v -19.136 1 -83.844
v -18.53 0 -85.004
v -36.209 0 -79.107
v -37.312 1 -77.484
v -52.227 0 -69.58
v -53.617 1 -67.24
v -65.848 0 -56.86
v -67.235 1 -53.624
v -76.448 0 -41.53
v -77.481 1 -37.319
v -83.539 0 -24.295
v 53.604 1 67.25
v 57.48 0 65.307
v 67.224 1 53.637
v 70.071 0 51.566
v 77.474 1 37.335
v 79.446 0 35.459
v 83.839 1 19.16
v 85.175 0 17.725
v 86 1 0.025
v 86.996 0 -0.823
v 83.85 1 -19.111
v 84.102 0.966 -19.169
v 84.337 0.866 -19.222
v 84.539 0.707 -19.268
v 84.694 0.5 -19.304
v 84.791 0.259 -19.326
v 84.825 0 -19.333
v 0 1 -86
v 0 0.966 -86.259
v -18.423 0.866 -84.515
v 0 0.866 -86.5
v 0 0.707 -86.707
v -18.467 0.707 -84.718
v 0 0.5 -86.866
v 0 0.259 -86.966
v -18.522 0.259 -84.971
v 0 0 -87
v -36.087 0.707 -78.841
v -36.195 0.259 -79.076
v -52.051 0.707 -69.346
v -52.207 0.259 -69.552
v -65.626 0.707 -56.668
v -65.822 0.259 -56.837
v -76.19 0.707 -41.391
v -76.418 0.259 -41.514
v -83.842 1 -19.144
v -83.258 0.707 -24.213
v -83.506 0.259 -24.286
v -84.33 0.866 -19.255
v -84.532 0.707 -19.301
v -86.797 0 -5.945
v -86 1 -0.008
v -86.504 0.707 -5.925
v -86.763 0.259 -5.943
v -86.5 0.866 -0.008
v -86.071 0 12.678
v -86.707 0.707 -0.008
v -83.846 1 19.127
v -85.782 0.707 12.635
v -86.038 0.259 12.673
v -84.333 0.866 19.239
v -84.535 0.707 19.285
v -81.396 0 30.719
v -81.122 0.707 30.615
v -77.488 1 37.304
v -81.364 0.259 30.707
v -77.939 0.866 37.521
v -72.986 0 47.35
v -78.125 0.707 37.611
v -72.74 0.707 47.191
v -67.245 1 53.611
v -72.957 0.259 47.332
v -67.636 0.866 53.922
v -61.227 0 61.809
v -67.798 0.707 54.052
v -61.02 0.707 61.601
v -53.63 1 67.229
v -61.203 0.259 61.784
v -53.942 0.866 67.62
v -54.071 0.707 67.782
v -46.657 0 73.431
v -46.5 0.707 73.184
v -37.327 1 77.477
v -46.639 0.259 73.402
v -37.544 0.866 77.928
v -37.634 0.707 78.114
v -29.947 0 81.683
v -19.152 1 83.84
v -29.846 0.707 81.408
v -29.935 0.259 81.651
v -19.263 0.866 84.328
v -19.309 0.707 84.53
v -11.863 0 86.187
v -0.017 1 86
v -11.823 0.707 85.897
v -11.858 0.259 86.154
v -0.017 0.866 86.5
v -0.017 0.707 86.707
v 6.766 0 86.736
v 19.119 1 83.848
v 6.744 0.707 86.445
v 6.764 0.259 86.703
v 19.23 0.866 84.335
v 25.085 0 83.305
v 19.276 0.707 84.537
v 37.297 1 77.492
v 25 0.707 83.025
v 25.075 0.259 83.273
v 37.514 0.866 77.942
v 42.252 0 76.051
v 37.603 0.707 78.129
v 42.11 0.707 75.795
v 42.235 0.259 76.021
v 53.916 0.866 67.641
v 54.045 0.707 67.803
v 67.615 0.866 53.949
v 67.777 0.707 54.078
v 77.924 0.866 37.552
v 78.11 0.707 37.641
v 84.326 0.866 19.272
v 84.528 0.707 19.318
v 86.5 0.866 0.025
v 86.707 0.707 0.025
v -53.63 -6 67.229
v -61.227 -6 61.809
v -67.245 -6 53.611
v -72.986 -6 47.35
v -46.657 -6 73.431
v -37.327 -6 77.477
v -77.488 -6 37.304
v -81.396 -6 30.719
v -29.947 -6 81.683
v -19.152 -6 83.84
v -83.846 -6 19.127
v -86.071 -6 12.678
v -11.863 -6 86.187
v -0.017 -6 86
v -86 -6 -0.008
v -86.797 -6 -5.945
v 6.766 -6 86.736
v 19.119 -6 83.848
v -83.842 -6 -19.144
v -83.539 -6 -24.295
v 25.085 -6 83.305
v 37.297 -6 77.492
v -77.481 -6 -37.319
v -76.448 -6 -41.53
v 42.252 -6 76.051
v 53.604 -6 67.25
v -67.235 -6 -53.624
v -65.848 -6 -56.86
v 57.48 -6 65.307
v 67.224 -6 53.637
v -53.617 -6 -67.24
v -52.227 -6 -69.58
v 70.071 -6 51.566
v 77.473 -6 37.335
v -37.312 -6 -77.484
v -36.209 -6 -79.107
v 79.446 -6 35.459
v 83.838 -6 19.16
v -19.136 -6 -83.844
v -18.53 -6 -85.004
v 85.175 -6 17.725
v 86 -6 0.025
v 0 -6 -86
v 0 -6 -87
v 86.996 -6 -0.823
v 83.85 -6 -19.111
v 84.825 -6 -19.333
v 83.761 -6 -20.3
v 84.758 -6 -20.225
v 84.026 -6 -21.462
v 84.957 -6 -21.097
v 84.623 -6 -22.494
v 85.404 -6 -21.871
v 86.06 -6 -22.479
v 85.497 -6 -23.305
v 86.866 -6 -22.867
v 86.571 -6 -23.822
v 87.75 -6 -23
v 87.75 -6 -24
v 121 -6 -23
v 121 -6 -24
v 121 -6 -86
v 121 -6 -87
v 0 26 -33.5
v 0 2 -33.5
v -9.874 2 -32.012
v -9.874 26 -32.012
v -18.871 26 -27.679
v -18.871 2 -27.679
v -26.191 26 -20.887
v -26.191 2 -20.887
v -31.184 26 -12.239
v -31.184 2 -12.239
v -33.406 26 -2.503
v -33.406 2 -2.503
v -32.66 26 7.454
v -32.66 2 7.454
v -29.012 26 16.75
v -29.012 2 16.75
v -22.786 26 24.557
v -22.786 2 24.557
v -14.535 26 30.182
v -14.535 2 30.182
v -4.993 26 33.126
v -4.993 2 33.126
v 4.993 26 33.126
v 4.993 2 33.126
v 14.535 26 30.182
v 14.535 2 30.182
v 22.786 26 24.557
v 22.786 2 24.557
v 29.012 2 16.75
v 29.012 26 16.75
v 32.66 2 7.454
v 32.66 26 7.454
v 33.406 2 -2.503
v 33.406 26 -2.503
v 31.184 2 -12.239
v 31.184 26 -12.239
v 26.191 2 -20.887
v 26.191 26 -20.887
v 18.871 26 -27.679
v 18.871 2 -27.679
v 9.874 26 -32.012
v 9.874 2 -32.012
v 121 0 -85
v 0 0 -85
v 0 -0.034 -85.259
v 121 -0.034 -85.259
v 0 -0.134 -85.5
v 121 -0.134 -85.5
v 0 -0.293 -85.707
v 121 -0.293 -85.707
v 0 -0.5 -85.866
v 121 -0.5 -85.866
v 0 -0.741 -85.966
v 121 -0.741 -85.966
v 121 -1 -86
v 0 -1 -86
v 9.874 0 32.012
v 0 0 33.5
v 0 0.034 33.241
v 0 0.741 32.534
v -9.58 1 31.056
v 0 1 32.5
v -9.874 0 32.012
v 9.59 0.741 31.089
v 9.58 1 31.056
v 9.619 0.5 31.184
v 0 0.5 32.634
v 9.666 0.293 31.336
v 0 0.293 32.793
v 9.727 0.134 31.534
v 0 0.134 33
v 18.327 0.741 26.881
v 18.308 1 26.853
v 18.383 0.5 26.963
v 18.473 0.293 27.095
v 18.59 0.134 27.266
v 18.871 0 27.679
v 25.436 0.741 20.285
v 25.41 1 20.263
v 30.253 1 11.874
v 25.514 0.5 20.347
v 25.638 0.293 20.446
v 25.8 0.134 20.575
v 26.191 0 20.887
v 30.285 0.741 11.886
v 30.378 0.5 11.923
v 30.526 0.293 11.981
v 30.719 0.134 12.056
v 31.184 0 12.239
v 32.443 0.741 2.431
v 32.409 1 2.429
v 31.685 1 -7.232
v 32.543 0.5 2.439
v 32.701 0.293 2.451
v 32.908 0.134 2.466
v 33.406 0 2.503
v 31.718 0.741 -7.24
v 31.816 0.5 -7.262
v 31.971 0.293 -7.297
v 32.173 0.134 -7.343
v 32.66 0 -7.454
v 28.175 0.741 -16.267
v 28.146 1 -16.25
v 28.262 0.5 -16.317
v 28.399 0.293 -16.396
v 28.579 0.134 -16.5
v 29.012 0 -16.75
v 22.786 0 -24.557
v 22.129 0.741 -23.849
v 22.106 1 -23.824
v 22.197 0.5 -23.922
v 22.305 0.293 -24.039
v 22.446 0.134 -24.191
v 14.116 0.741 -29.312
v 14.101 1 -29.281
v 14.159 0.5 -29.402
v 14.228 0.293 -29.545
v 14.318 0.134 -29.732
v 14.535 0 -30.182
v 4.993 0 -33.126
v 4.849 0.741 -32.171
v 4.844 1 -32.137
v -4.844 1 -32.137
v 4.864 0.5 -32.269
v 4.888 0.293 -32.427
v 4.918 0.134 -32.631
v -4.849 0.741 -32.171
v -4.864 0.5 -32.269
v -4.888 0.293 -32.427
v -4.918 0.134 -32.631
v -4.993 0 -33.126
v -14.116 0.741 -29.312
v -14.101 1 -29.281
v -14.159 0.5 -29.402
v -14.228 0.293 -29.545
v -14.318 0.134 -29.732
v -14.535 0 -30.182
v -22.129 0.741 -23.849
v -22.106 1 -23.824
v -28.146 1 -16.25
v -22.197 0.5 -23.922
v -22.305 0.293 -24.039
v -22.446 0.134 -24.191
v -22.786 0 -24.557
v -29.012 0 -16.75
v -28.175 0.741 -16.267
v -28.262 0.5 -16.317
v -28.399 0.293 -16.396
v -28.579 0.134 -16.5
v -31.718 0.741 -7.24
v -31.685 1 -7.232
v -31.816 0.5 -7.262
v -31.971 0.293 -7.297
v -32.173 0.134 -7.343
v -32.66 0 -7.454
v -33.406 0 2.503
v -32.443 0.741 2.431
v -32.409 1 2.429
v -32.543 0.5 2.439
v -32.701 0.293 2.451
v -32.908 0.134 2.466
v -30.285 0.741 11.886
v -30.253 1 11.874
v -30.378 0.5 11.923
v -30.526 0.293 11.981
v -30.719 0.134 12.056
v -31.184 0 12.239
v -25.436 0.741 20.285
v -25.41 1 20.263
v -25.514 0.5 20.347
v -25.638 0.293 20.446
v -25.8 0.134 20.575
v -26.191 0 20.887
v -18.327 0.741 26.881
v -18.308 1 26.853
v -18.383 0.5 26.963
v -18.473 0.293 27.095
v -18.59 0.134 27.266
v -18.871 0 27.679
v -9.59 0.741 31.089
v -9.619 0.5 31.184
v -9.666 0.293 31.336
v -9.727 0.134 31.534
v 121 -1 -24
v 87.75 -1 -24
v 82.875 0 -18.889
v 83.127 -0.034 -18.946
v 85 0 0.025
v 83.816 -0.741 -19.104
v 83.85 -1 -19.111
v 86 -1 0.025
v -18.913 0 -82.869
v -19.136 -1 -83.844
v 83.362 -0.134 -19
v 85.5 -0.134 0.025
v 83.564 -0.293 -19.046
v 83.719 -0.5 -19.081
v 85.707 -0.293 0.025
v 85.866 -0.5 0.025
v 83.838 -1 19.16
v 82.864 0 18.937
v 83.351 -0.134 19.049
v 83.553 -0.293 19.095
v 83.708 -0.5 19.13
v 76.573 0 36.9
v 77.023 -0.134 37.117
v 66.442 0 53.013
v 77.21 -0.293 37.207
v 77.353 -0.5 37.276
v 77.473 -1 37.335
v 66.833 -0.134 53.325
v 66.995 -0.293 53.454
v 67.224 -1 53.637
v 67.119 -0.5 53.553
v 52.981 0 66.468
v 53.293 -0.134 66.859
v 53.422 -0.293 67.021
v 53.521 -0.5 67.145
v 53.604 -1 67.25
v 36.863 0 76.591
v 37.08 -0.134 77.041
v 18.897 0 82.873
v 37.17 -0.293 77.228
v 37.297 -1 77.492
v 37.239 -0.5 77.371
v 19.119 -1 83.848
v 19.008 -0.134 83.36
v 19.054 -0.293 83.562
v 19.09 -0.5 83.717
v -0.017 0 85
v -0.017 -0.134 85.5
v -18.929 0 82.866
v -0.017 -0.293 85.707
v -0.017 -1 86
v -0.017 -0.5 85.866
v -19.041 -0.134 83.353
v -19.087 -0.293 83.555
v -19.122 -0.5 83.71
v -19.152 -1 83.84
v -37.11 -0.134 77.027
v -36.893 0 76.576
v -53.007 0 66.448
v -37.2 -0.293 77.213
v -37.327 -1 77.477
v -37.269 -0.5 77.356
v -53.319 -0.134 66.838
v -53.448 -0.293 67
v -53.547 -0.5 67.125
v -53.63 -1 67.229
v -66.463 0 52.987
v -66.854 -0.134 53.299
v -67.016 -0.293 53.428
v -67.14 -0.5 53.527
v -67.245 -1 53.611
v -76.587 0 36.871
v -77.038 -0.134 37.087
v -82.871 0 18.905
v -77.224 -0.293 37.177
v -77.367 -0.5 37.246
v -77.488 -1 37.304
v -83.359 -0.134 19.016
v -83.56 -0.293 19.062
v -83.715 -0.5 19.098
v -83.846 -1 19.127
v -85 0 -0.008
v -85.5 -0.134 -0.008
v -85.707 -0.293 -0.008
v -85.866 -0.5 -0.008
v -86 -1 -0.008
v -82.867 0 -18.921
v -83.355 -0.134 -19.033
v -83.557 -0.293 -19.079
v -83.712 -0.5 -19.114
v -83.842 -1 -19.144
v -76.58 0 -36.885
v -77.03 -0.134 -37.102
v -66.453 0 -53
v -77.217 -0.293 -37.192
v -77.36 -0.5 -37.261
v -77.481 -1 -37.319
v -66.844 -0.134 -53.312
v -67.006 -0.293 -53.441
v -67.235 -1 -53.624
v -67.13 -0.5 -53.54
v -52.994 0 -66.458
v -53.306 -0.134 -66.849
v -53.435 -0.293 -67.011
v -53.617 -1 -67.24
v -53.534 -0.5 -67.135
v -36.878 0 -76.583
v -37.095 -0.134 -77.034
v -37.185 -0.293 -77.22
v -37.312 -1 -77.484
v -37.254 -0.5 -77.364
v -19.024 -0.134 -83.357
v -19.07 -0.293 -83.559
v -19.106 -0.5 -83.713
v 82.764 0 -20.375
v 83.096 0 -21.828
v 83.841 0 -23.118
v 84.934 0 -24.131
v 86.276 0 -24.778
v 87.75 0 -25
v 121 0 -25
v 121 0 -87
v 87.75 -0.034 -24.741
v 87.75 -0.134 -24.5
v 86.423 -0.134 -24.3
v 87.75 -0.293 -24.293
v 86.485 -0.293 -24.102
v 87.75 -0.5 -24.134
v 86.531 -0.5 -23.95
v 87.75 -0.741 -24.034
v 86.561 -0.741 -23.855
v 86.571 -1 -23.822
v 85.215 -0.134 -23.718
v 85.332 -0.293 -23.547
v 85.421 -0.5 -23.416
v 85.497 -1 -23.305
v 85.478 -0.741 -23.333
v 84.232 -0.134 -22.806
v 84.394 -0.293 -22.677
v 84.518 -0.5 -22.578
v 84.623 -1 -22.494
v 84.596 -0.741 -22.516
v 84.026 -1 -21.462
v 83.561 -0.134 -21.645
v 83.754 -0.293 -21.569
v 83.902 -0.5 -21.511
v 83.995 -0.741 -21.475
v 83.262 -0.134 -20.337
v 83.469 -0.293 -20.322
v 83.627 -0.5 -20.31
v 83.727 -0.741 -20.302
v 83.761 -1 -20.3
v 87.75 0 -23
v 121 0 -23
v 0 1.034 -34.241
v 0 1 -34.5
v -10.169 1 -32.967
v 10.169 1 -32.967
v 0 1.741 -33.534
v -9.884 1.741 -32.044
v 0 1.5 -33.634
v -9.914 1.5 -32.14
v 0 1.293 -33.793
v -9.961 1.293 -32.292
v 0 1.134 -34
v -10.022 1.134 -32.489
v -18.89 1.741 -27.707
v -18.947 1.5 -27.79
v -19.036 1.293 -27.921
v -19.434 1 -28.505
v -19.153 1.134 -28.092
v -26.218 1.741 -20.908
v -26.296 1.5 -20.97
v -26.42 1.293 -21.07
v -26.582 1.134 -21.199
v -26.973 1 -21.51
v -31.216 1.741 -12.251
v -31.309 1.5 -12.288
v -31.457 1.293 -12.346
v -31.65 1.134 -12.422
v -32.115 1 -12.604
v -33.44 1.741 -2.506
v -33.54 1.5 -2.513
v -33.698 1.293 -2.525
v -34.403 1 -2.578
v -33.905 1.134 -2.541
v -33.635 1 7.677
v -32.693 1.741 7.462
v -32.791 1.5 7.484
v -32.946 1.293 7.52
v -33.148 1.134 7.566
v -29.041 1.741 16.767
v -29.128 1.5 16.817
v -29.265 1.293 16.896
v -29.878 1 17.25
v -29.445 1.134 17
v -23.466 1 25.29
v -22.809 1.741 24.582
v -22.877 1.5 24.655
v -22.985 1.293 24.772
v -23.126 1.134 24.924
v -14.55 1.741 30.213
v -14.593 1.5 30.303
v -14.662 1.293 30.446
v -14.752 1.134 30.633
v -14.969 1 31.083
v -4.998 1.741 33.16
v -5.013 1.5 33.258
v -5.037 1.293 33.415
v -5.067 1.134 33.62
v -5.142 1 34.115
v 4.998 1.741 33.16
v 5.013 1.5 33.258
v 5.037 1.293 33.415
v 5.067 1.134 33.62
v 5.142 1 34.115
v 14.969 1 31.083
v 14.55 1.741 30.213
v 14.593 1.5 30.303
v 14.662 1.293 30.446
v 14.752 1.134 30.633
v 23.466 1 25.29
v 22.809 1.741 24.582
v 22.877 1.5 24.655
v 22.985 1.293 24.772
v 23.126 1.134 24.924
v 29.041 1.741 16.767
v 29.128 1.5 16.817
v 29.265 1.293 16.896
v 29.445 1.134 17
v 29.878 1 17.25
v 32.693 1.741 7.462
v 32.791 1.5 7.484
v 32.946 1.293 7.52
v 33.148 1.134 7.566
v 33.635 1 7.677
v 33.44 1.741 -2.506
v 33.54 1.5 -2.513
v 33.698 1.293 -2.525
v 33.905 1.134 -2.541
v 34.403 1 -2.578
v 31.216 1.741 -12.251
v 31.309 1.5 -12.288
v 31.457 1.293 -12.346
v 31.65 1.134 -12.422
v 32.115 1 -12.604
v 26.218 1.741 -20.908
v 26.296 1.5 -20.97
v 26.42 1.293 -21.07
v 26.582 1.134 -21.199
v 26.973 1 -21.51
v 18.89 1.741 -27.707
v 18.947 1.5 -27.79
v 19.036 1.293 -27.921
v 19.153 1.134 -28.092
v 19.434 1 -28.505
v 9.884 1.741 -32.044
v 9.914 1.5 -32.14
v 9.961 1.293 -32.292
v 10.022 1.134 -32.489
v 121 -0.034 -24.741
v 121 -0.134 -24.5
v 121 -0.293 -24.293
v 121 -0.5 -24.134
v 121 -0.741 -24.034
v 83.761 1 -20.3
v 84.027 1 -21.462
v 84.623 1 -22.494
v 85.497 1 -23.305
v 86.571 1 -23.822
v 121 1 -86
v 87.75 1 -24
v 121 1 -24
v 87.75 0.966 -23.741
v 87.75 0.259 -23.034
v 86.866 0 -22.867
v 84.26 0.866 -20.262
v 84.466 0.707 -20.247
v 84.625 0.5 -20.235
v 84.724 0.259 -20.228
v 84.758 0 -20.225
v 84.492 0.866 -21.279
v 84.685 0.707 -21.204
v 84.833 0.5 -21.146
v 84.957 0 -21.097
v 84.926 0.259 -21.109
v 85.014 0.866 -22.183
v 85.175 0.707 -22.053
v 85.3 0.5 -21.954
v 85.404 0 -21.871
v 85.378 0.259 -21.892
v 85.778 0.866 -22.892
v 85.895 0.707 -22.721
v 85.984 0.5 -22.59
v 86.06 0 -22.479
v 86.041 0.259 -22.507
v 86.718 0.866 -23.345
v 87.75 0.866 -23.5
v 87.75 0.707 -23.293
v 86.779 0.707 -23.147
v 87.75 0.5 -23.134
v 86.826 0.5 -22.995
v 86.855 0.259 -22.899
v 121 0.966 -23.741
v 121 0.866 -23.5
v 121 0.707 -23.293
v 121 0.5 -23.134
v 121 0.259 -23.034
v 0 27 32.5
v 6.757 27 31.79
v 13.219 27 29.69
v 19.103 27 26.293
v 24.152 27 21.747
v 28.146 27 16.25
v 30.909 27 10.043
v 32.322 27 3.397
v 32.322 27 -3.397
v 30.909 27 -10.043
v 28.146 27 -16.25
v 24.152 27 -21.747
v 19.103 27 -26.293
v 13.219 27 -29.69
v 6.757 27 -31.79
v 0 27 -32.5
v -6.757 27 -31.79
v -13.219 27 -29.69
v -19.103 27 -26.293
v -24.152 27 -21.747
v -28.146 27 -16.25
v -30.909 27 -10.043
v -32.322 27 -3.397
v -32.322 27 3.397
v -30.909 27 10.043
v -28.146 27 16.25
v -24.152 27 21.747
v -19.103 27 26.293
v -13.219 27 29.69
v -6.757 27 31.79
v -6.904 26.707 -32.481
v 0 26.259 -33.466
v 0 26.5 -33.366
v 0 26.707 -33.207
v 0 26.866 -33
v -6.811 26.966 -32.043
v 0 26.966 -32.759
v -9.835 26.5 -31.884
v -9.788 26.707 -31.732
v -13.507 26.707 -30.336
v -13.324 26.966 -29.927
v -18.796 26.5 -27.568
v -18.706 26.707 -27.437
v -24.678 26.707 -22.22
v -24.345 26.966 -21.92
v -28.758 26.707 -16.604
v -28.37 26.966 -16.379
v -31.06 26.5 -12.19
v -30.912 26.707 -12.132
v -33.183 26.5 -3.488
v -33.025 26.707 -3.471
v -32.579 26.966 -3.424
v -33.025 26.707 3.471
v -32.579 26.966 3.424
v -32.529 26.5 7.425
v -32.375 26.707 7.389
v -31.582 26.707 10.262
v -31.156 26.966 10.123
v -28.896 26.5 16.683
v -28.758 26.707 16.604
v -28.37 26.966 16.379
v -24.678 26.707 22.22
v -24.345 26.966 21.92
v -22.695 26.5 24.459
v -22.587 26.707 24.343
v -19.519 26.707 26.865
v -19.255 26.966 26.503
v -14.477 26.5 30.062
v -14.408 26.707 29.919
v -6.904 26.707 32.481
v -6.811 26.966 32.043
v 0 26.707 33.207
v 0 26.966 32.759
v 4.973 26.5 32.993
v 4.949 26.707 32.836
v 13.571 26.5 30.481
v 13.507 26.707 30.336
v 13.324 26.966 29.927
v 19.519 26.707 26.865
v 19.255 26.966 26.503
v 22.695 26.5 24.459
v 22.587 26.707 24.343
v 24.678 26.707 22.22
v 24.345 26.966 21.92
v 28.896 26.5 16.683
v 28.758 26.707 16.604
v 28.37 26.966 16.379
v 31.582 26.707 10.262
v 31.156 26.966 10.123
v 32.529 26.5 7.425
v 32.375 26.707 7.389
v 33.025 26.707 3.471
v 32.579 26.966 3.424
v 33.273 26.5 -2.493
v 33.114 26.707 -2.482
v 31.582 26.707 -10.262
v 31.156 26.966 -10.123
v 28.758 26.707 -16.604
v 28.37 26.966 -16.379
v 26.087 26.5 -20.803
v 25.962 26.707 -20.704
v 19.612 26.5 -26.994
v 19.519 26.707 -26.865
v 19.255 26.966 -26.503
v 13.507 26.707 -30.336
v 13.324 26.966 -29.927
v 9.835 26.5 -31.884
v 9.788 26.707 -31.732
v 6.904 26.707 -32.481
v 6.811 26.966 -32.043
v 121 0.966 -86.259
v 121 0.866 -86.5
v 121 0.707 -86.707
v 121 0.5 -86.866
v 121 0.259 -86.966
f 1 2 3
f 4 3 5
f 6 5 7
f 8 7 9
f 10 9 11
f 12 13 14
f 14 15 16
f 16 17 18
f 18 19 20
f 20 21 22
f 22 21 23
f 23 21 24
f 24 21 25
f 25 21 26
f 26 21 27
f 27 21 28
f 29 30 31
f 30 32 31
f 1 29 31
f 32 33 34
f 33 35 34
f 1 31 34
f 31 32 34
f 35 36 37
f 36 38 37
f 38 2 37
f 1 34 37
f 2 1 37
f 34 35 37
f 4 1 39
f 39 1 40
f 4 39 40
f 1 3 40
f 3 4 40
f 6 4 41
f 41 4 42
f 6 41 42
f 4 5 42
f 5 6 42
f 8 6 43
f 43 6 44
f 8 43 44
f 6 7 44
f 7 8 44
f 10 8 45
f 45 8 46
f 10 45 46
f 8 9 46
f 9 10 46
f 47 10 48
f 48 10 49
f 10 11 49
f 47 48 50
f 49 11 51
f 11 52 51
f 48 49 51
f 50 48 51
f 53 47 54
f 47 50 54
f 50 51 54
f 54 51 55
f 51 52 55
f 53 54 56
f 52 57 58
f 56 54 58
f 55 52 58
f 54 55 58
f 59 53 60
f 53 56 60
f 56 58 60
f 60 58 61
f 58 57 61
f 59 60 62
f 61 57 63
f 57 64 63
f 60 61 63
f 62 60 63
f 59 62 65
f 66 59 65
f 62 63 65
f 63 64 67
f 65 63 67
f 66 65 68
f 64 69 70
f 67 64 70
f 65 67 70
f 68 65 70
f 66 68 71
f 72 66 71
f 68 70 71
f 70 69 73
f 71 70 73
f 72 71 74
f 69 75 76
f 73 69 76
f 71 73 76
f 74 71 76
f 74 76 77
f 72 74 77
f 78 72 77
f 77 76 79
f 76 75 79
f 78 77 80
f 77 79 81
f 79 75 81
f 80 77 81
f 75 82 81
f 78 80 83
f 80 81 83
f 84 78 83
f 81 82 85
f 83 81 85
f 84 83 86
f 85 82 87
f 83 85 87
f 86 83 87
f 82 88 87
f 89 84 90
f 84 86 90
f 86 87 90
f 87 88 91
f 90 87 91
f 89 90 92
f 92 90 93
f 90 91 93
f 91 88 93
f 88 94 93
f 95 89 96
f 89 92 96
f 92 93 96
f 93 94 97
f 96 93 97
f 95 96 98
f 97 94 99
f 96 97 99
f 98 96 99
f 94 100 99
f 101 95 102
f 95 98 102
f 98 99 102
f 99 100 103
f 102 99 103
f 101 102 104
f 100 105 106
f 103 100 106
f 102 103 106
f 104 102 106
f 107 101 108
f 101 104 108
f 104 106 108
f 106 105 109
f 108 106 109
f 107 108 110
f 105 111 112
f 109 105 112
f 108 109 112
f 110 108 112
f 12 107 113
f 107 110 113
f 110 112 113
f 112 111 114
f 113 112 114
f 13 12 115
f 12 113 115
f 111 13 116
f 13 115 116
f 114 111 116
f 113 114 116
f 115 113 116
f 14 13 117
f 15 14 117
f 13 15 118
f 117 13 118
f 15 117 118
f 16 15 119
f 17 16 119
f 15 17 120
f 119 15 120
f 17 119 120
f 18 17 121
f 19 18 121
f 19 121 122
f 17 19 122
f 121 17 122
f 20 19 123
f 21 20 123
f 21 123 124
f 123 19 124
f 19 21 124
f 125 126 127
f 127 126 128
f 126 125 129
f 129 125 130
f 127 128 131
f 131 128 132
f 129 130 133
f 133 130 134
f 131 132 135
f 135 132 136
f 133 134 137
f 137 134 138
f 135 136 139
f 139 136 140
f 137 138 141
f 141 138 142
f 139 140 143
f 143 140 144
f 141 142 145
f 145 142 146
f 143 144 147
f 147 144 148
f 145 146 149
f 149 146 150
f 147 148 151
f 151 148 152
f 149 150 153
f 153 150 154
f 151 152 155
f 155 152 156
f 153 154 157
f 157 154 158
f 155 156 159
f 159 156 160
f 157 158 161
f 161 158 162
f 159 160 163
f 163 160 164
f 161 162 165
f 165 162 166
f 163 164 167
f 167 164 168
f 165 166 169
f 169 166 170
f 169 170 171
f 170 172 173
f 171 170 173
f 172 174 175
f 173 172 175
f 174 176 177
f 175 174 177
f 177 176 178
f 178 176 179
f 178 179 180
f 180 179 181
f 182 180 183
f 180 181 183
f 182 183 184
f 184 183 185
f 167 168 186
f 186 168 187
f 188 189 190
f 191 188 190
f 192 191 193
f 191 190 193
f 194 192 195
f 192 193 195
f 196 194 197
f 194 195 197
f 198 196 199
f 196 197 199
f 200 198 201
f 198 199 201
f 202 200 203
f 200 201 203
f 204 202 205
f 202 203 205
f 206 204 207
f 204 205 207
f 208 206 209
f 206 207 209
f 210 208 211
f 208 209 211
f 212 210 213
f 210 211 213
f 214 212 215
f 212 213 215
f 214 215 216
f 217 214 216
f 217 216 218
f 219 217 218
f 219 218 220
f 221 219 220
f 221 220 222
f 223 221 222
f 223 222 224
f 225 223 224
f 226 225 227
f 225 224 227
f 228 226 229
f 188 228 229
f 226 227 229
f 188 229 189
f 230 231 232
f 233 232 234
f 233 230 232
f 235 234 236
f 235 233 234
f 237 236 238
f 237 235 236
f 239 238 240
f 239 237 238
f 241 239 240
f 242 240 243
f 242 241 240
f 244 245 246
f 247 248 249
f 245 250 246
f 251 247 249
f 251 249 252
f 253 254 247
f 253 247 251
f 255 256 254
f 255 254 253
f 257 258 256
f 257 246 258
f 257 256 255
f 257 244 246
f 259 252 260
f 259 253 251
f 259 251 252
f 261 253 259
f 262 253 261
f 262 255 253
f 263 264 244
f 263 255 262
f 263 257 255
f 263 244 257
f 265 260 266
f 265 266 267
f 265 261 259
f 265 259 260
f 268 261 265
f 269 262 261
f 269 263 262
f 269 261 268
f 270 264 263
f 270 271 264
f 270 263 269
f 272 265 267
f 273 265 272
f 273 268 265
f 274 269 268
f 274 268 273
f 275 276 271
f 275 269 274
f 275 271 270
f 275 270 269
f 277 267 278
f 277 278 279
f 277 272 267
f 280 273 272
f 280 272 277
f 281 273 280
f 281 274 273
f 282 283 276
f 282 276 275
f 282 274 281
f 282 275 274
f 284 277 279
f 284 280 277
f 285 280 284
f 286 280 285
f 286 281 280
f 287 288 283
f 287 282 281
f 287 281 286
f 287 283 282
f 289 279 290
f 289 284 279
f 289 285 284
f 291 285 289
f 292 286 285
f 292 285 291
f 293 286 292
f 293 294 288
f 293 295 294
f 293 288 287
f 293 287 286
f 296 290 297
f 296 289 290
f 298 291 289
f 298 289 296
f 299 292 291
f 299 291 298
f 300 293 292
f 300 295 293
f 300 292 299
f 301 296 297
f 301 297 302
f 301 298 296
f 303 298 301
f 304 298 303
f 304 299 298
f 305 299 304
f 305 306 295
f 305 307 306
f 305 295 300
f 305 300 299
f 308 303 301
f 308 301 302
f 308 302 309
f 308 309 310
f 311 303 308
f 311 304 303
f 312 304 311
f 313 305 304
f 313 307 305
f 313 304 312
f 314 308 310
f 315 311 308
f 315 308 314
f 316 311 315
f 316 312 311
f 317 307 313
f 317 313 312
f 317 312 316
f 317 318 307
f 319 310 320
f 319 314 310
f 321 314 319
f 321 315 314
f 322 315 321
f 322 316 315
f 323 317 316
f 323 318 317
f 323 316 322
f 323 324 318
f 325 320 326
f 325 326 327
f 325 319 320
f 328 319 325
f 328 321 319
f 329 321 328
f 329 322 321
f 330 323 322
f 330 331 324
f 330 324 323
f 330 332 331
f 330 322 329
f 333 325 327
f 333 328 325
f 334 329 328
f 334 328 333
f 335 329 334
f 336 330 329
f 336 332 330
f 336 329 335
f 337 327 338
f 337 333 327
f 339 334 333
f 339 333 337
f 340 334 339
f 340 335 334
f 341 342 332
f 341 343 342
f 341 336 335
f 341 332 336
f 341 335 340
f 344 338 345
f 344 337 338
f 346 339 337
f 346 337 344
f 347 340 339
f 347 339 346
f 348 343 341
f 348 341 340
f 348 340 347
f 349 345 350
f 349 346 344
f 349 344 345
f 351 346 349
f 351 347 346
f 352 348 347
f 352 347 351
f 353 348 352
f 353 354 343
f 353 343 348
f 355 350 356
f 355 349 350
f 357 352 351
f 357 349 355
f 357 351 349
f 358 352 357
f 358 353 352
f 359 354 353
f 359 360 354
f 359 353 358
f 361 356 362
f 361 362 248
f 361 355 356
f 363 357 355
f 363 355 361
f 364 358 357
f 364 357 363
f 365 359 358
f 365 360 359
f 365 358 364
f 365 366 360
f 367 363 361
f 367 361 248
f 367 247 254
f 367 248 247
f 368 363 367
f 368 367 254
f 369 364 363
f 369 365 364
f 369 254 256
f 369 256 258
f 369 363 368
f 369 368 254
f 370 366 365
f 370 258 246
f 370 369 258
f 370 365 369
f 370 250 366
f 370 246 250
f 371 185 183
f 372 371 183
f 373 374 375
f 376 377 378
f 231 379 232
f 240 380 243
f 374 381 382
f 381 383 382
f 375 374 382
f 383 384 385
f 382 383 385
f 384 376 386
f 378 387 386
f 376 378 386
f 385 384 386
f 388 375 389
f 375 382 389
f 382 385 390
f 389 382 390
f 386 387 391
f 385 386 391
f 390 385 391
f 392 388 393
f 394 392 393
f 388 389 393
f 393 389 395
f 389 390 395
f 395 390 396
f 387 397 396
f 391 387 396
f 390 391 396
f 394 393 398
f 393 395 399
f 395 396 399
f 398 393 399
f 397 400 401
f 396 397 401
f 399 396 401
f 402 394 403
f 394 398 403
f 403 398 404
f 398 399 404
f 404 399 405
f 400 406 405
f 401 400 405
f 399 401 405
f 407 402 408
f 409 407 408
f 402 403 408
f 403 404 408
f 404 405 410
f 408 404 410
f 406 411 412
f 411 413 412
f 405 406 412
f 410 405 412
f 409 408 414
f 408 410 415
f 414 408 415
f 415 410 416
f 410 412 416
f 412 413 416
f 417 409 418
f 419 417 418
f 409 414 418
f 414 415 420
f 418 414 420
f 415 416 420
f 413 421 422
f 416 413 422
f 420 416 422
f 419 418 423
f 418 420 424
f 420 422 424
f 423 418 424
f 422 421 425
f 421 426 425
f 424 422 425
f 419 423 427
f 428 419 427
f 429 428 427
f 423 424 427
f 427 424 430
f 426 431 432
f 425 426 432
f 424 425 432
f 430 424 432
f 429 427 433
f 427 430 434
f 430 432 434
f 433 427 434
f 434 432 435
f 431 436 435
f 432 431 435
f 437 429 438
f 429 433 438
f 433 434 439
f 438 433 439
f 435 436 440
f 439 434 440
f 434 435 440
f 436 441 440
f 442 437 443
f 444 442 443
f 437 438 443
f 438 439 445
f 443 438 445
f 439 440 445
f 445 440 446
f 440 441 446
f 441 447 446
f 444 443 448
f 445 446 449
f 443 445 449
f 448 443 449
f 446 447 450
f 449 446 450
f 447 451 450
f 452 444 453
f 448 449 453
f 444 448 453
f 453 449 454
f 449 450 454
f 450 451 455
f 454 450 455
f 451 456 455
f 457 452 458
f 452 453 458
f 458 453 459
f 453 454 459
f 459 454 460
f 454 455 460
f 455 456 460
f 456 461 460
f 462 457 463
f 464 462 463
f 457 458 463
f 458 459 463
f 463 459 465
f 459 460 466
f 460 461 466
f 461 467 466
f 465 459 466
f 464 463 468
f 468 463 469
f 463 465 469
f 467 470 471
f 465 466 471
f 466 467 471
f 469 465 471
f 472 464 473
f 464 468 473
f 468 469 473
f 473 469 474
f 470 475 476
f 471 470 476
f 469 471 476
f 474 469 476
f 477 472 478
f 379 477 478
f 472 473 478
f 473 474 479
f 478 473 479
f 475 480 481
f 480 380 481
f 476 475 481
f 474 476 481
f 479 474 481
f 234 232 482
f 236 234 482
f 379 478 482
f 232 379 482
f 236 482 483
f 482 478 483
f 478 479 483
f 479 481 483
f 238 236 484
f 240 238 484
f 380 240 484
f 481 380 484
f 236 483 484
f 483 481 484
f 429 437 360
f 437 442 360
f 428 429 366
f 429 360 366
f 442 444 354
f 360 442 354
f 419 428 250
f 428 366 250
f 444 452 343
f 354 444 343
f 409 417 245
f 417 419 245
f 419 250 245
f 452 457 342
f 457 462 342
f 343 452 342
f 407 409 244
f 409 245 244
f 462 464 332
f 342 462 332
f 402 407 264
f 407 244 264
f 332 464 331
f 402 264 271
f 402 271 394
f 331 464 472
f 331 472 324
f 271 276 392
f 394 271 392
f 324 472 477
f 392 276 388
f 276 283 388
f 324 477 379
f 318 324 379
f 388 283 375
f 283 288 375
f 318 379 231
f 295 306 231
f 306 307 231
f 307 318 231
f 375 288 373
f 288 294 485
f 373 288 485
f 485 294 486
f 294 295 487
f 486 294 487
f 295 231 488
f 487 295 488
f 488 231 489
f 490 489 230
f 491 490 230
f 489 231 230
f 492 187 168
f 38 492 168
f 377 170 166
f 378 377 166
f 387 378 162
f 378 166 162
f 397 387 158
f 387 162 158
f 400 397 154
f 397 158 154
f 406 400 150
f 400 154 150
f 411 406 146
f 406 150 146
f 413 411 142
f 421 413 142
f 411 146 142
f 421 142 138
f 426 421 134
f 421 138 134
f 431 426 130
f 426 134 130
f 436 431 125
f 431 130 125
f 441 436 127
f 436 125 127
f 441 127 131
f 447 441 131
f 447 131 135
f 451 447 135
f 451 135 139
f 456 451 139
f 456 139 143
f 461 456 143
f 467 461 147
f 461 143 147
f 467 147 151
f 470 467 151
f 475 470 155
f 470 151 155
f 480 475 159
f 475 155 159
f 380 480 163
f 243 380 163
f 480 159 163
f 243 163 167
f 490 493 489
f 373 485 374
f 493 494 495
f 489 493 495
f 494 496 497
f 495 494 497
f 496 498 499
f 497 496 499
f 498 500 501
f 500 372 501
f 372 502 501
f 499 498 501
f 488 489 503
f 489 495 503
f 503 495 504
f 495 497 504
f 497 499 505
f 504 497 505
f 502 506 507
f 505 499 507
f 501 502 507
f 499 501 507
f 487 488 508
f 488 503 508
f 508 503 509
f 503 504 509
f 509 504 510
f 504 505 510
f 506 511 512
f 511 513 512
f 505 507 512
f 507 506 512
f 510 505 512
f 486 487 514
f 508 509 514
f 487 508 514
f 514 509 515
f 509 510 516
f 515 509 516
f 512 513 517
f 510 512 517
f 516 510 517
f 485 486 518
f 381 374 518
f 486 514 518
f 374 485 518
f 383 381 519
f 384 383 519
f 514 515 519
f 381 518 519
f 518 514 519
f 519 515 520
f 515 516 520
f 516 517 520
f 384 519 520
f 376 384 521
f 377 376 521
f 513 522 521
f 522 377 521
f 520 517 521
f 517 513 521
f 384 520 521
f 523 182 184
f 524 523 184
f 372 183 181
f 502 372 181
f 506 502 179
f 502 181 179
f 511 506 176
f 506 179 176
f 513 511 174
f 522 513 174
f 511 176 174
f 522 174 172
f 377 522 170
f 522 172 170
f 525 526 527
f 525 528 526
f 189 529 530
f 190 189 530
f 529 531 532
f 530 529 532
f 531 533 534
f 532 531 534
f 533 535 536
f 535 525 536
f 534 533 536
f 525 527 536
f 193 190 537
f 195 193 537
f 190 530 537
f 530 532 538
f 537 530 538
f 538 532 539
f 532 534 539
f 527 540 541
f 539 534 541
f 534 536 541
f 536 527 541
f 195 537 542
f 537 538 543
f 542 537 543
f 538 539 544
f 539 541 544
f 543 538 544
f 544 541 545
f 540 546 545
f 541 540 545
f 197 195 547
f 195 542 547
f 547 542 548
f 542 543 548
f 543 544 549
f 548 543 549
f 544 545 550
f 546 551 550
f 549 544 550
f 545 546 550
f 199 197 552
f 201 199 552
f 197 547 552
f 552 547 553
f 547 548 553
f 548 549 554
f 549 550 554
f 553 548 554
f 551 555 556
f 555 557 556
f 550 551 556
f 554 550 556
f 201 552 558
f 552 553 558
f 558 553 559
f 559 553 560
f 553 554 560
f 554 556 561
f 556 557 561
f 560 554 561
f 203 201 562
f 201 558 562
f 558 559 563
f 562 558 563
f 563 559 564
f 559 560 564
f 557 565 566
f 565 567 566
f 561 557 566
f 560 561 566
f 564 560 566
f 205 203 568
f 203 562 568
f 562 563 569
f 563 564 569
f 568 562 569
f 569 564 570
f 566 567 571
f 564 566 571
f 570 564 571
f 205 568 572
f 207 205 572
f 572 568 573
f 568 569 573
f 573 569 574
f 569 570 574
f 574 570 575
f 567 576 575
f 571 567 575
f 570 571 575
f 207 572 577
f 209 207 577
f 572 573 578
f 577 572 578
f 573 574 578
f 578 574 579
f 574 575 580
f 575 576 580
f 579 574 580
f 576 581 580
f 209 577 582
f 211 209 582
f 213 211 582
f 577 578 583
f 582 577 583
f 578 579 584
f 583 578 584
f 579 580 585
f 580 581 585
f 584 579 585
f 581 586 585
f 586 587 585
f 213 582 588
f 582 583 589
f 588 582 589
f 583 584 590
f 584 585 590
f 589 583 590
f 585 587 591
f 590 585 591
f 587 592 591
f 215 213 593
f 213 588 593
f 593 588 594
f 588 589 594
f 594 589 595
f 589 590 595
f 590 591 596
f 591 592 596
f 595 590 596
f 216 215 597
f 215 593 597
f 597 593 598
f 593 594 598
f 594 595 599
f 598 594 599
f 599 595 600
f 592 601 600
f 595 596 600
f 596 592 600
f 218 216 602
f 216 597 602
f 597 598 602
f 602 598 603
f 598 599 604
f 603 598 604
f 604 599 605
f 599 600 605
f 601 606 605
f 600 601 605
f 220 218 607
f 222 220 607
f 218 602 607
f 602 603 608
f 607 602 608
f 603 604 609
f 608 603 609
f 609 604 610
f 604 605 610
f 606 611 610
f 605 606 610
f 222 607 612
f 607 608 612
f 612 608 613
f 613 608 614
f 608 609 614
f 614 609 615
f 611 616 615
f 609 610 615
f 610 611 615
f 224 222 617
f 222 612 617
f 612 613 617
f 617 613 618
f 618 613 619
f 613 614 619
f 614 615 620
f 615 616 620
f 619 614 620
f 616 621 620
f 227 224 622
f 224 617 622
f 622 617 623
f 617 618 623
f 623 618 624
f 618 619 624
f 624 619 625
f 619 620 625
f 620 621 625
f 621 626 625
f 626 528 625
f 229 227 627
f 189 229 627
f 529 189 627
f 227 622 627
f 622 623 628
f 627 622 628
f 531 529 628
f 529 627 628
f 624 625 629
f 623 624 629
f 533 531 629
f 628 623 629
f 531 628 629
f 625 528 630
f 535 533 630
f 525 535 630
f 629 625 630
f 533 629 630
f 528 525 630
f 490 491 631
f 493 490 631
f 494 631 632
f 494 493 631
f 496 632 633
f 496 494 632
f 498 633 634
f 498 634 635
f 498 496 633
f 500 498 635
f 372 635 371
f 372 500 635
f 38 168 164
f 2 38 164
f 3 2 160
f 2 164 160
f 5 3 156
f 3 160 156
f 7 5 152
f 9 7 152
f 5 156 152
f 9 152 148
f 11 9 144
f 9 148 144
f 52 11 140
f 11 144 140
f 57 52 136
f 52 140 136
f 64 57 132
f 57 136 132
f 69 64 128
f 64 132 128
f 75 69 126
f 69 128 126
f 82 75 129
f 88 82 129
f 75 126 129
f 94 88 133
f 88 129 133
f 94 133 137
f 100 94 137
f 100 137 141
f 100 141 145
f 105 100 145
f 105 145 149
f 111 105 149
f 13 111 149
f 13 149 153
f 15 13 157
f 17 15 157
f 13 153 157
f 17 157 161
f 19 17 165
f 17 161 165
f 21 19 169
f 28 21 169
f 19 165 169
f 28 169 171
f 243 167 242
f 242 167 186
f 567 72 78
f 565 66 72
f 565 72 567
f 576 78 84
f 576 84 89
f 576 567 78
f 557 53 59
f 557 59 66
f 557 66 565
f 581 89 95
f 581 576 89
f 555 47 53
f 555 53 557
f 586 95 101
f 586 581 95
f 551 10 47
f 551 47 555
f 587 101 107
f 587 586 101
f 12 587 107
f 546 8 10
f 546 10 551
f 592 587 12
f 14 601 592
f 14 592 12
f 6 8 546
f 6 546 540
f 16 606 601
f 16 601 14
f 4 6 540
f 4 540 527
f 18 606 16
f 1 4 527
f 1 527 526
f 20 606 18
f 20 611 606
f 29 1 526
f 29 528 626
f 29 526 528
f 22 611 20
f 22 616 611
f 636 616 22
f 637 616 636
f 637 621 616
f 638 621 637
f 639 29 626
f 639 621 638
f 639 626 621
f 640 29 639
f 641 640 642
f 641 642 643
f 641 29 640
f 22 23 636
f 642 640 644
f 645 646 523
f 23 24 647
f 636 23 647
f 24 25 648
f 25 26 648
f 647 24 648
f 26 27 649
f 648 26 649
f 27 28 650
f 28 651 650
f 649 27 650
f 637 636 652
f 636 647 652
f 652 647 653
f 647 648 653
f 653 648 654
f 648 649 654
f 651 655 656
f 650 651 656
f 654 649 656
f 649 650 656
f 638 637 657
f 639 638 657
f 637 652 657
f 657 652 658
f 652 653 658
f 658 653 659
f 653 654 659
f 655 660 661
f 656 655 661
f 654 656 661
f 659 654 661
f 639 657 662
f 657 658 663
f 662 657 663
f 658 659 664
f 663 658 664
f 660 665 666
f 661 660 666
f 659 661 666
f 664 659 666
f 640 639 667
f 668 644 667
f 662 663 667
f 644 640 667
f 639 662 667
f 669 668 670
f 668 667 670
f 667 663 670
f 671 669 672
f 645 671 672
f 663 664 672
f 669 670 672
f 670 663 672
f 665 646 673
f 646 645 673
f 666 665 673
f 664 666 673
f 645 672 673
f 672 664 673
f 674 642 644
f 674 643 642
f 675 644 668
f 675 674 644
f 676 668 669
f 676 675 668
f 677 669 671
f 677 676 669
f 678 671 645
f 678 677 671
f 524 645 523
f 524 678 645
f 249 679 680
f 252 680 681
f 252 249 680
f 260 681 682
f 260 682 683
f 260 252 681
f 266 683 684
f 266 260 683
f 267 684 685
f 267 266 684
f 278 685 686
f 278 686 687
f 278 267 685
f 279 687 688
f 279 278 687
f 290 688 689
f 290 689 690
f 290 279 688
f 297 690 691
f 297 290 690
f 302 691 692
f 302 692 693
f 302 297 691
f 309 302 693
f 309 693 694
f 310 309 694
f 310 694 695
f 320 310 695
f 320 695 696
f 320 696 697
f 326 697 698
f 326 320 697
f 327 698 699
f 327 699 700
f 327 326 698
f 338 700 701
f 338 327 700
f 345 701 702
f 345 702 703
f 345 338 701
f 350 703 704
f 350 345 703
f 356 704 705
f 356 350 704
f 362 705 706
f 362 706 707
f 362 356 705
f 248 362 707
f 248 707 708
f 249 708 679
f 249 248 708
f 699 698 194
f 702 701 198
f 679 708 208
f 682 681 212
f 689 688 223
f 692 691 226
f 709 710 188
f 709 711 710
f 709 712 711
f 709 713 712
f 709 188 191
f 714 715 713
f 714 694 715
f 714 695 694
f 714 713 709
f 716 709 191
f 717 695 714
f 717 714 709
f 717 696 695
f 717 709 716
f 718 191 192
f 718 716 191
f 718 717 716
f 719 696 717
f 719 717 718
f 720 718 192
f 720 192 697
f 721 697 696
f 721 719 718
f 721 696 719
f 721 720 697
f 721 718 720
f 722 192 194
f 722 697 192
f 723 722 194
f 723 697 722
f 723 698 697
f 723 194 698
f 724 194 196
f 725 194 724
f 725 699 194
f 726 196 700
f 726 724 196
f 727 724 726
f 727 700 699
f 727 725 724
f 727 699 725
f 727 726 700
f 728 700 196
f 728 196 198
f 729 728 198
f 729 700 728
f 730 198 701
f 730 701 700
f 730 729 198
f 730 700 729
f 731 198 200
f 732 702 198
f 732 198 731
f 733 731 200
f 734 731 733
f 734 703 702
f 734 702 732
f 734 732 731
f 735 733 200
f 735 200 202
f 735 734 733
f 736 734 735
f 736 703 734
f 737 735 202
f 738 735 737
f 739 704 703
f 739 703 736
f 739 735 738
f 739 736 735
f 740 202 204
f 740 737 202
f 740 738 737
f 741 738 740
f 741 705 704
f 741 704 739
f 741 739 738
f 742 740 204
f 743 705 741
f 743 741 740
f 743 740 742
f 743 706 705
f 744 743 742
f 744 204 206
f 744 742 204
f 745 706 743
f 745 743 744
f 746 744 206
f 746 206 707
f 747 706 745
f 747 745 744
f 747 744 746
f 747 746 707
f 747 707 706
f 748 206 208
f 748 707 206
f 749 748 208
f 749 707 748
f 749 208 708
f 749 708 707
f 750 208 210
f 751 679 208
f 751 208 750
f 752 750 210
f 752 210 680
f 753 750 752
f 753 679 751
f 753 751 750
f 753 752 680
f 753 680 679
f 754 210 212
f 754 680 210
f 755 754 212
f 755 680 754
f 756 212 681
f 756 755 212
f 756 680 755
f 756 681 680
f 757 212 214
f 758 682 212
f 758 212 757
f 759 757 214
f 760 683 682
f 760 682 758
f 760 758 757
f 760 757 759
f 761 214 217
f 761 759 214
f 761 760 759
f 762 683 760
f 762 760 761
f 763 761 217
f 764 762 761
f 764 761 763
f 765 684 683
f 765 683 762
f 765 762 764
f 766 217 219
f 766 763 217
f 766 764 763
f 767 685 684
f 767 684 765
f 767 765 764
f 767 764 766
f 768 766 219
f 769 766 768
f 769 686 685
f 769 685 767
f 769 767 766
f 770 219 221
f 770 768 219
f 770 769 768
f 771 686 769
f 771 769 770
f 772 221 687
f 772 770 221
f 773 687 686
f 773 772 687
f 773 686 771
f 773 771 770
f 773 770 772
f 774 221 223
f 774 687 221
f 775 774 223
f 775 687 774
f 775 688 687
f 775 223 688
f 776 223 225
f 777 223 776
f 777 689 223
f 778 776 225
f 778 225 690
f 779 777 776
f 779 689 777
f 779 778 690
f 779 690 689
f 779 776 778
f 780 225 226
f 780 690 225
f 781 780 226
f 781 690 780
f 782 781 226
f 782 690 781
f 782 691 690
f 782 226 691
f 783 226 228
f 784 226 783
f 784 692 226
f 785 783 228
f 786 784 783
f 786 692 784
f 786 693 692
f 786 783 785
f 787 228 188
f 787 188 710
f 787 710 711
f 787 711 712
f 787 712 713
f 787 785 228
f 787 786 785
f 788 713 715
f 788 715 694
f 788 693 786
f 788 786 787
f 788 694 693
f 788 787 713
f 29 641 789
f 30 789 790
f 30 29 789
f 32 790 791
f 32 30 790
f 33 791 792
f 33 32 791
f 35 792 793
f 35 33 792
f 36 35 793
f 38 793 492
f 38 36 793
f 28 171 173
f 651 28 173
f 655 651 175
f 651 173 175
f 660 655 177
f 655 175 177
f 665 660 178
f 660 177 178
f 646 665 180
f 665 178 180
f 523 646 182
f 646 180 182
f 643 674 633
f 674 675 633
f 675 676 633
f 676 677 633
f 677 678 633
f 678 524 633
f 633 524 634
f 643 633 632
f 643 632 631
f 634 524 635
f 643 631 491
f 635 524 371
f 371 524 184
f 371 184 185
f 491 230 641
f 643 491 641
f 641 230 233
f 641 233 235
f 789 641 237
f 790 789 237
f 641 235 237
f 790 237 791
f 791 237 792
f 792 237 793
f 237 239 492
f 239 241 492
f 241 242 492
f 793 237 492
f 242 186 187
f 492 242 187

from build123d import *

# Parameters (mm, degrees)
BOSS_EXTRUDE1_DEPTH = 1
BOSS_EXTRUDE2_START = -6
BOSS_EXTRUDE2_DEPTH = 6
SKETCH4_R           = 33.5
SKETCH4_R_2         = 32.5
BOSS_EXTRUDE3_DEPTH = 26
CUT_EXTRUDE3_START  = -1
SKETCH4_4_R         = 32.5
CUT_EXTRUDE3_DEPTH  = 27
FILLET2_R           = 1


with BuildPart() as part:
    # Sketch1 → Boss-Extrude1 (new body)
    with BuildSketch(Plane(origin=(0, 0, 0), x_dir=(1, 0, 0), z_dir=(0, 1, 0))):
        with BuildLine():
            Line((121, 23), (121, 87))
            Line((121, 87), (0, 87))
            ThreePointArc((0, 87), (-54.254032108, -68.011028517), (84.824655745, 19.333333333))
            ThreePointArc((84.824655745, 19.333333333), (85.404435994, 21.870828693), (87.749643874, 23))
            Line((87.749643874, 23), (121, 23))
        make_face()
    extrude(amount=BOSS_EXTRUDE1_DEPTH)

    # Sketch1<3> → Boss-Extrude2 (add)
    with BuildSketch(Plane(origin=(0, 0, 0), x_dir=(1, 0, 0), z_dir=(0, 1, 0)).offset(BOSS_EXTRUDE2_START)):
        with BuildLine():
            Line((121, 23), (121, 24))
            Line((121, 24), (87.749643874, 24))
            ThreePointArc((87.749643874, 24), (84.622700034, 22.494438258), (83.849659702, 19.111111111))
            ThreePointArc((83.849659702, 19.111111111), (-53.630422544, -67.229292557), (0, 86))
            Line((0, 86), (121, 86))
            Line((121, 86), (121, 87))
            Line((121, 87), (0, 87))
            ThreePointArc((0, 87), (-54.254032108, -68.011028517), (84.824655745, 19.333333333))
            ThreePointArc((84.824655745, 19.333333333), (85.404435994, 21.870828693), (87.749643874, 23))
            Line((87.749643874, 23), (121, 23))
        make_face()
    extrude(amount=BOSS_EXTRUDE2_DEPTH)

    # Sketch4 → Boss-Extrude3 (add)
    # profile 1 of 2: a face of its own
    with BuildSketch(Plane(origin=(0, 1, 0), x_dir=(1, 0, 0), z_dir=(0, 1, 0))):
        with Locations(Location((0, 0, 0), (0, 0, 90))):
            Circle(SKETCH4_R)
        Circle(SKETCH4_R_2, mode=Mode.SUBTRACT)
    # profile 2 of 2: a face of its own
    with BuildSketch(Plane(origin=(0, 1, 0), x_dir=(1, 0, 0), z_dir=(0, 1, 0))):
        Circle(SKETCH4_R_2)
    extrude(amount=BOSS_EXTRUDE3_DEPTH)

    # Sketch4<4> → Cut-Extrude3 (cut)
    with BuildSketch(Plane(origin=(0, 1, 0), x_dir=(1, 0, 0), z_dir=(0, 1, 0)).offset(CUT_EXTRUDE3_START)):
        with Locations(Location((0, 0, 0), (0, 0, 270))):
            Circle(SKETCH4_4_R)
    extrude(amount=CUT_EXTRUDE3_DEPTH, mode=Mode.SUBTRACT)

    # Fillet2
    fillet2_edges = [part.edges().sort_by_distance(p)[0] for p in [
        (60.5, 1, -87),
        (-54.254032108, 1, 68.011028517),
        (-53.630422544, 0, 67.229292557),
        (85.404435994, 1, -21.870828693),
        (104.374821937, 0, -24),
        (84.622700034, 0, -22.494438258),
        (60.5, 0, -86),
        (104.374821937, 1, -23),
        (0, 1, 33.5),
        (0, 27, 33.5),
        (0, 0, -32.5),
    ]]
    fillet(fillet2_edges, radius=FILLET2_R - 0.0001)  # a hair under: the kernel refuses the full size


solid = part.part
